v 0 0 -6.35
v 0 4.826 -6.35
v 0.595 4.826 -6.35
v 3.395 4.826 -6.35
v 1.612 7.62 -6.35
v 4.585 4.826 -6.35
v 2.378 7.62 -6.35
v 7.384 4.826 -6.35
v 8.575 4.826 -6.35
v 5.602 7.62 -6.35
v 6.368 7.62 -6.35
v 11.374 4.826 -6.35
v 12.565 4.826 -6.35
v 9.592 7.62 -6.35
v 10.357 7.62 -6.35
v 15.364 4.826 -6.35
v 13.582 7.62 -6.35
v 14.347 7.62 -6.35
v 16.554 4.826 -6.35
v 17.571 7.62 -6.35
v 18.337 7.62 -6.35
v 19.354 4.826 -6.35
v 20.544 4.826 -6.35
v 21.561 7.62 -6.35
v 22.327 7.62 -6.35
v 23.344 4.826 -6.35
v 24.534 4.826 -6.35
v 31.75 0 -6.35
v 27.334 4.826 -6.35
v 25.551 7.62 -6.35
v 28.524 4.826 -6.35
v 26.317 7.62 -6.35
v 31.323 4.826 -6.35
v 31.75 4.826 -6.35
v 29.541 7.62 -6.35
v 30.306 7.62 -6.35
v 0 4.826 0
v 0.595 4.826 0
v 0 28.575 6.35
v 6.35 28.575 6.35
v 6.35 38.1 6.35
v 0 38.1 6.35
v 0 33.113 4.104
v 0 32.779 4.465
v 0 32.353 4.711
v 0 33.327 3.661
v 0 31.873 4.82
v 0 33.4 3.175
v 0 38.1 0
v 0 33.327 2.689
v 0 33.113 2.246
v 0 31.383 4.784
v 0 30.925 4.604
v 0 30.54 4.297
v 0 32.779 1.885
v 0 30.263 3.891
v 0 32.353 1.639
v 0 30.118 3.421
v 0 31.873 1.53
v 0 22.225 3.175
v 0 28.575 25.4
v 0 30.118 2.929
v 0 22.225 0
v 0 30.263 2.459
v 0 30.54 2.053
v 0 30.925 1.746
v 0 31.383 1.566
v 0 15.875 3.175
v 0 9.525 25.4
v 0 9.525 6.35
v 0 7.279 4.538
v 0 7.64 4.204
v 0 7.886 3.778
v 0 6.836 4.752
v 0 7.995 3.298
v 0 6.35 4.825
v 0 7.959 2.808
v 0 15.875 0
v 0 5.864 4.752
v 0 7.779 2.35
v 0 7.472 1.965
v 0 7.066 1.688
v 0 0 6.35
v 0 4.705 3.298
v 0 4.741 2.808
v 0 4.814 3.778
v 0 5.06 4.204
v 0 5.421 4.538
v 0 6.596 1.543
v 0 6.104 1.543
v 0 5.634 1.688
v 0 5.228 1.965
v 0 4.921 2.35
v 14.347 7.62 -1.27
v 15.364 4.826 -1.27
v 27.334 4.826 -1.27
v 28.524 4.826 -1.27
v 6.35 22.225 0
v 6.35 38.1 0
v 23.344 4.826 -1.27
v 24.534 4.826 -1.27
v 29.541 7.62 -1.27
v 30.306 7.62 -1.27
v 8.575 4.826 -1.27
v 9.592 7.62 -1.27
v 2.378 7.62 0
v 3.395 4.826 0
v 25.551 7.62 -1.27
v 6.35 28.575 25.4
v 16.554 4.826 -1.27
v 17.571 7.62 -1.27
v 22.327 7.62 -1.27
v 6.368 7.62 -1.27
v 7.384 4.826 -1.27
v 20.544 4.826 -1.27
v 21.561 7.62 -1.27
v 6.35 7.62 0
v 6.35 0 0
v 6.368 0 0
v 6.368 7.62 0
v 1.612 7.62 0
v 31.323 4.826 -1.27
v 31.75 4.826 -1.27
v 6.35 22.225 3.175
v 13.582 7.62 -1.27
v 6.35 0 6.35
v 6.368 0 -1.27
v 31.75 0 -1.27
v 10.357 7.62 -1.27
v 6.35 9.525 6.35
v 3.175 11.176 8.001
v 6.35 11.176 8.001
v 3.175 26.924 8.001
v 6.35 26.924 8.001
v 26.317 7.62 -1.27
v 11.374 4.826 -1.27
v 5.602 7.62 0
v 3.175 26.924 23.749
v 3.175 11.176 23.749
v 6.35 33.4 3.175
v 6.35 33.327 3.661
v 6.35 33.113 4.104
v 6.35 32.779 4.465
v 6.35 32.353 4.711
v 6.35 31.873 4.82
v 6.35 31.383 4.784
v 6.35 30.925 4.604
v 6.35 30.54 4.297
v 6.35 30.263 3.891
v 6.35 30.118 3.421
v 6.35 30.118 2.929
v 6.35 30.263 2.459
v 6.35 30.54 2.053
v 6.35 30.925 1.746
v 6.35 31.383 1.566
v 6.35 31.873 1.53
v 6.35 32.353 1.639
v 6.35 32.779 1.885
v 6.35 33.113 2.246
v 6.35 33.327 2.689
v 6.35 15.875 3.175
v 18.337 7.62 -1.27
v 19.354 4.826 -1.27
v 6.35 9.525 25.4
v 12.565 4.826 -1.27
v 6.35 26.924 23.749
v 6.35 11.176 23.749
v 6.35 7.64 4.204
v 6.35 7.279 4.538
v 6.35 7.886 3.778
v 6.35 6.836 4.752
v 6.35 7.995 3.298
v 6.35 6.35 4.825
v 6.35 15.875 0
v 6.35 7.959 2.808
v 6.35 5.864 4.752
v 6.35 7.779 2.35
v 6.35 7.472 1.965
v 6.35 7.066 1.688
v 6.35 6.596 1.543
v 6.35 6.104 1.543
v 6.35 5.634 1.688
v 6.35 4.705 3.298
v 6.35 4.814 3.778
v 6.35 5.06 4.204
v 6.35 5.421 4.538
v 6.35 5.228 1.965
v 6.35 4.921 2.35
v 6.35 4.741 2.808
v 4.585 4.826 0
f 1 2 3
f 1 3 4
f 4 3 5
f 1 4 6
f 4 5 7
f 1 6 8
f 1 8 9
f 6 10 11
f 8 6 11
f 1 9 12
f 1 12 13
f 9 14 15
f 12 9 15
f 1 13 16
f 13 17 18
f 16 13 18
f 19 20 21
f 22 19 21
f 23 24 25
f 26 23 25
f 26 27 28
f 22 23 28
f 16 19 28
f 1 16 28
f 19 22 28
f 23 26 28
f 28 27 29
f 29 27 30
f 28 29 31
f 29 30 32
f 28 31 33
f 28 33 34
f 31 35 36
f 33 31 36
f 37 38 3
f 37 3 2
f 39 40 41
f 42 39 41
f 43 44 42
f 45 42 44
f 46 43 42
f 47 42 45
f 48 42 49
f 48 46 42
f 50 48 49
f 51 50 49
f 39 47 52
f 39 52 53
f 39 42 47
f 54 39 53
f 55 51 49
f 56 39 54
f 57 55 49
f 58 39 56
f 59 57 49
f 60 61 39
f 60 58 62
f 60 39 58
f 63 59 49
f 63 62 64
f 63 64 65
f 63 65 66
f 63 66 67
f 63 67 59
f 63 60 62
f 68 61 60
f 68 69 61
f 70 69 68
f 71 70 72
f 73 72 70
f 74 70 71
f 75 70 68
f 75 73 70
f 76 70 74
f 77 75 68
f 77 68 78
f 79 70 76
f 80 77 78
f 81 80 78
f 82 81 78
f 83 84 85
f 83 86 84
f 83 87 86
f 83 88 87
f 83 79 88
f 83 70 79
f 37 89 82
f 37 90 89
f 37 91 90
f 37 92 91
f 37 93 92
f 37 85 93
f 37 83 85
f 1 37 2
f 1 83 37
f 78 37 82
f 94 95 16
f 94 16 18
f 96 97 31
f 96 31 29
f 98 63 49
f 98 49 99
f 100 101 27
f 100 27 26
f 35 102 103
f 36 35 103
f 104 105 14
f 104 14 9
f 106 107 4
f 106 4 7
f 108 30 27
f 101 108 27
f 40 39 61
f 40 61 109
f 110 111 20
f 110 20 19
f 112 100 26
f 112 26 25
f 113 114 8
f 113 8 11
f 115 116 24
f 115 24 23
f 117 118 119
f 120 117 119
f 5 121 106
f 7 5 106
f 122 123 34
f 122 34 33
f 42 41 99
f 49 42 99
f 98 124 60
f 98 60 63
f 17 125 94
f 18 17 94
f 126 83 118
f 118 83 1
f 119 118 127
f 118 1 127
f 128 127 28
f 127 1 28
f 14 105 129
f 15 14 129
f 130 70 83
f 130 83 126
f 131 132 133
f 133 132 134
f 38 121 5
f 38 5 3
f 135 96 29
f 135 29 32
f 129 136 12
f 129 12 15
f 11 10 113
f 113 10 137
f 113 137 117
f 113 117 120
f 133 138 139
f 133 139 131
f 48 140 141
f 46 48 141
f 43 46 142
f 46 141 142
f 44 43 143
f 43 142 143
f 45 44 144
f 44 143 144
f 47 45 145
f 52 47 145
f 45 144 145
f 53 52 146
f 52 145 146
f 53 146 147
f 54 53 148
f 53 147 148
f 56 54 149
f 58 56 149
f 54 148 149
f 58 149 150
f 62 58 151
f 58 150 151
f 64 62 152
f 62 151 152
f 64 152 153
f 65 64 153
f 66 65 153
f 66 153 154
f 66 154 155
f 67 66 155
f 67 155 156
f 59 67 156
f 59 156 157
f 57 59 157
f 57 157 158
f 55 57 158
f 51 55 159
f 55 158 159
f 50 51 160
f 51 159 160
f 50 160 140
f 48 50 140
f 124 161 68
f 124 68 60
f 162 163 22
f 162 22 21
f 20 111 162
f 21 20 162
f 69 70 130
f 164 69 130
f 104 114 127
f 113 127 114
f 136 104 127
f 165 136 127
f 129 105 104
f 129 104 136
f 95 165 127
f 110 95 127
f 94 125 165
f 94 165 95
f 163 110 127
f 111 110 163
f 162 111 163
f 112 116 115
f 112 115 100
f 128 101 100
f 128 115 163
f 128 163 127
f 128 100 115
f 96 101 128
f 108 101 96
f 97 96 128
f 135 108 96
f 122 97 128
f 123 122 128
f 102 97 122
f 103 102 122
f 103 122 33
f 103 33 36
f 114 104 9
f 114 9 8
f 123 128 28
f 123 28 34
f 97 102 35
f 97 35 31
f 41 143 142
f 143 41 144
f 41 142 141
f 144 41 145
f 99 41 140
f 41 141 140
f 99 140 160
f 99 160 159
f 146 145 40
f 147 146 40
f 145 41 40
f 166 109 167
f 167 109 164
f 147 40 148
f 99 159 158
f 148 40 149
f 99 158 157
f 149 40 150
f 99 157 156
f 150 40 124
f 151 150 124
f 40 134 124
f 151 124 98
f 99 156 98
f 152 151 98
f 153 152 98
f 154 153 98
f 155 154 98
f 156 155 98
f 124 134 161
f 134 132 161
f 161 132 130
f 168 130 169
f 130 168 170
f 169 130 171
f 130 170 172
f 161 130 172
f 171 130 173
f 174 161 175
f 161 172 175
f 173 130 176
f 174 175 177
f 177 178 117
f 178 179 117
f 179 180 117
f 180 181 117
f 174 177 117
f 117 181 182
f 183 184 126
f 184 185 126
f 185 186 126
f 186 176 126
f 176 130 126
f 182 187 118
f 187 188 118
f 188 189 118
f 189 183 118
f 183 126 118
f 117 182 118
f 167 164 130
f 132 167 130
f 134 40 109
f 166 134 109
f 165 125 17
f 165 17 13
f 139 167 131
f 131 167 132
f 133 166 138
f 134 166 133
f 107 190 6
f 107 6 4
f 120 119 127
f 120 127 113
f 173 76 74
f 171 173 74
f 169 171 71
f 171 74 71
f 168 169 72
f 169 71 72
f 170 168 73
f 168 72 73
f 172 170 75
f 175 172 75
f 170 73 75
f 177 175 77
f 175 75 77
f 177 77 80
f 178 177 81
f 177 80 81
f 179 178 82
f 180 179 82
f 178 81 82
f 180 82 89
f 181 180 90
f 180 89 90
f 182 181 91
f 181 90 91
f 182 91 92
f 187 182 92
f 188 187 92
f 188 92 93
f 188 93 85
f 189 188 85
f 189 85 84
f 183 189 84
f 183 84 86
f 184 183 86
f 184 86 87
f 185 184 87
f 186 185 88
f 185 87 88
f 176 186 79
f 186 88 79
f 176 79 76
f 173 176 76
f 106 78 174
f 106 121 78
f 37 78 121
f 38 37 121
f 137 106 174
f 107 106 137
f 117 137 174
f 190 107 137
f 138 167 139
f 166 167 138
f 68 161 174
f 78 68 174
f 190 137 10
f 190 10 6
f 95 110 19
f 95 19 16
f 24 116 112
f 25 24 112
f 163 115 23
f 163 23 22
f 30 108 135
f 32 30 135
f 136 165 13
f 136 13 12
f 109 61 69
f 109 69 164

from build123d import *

# Parameters (mm, degrees)
BLANKSKE_W          = 31.75
BLANKSKE_H          = 7.62
BLANK_DEPTH         = 6.35
TOOTHCUTSIM_DEPTH   = 34.263334168
TEETHCUTS_COUNT     = 9
TEETHCUTS_PITCH     = 3.989822666
SKETCH1_W           = 6.35
SKETCH1_H           = 12.7
BOSS_EXTRUDE1_DEPTH = 6.35
SKETCH2_R           = 1.65
CUT_EXTRUDE1_DEPTH  = 6.35
SKETCH4_W           = 6.35
SKETCH4_H           = 19.05
BOSS_EXTRUDE3_DEPTH = 19.05
SKETCH6_W           = 6.35
SKETCH6_H           = 12.7
BOSS_EXTRUDE5_DEPTH = 6.35
SKETCH7_R           = 1.65
CUT_EXTRUDE2_DEPTH  = 6.35
SKETCH8_W           = 15.748
SKETCH8_H           = 15.748
CUT_EXTRUDE3_DEPTH  = 3.175
SKETCH11_W          = 6.35
SKETCH11_H          = 6.35
BOSS_EXTRUDE7_DEPTH = 12.7
SKETCH12_W          = 3.175
SKETCH12_H          = 6.35
CUT_EXTRUDE4_DEPTH  = 6.35
SKETCH13_W          = 25.382452533
SKETCH13_H          = 7.62
CUT_EXTRUDE5_DEPTH  = 1.27


with BuildPart() as part:
    # BlankSke → Blank (new body)
    with BuildSketch(Plane.XY):
        with Locations((15.875, 3.81)):
            Rectangle(BLANKSKE_W, BLANKSKE_H)
    extrude(amount=-BLANK_DEPTH)

    # TooCutSkeSim → ToothCutSim (cut, through all)
    with BuildSketch(Plane.XY):
        Polygon((0.595165029, 4.826), (-0.595165029, 4.826), (-1.621342708, 7.6454), (1.621342708, 7.6454), align=None)
    toothcutsim = extrude(amount=-TOOTHCUTSIM_DEPTH, mode=Mode.SUBTRACT)

    # TeethCuts: ToothCutSim ×9
    with Locations(*[(i * TEETHCUTS_PITCH, 0, 0) for i in range(1, TEETHCUTS_COUNT)]):
        add(toothcutsim, mode=Mode.SUBTRACT)

    # Sketch1 → Boss-Extrude1 (add)
    with BuildSketch(Plane.XY):
        with Locations((3.175, 6.35)):
            Rectangle(SKETCH1_W, SKETCH1_H)
    extrude(amount=BOSS_EXTRUDE1_DEPTH)

    # Sketch2 → Cut-Extrude1 (cut)
    with BuildSketch(Plane.ZY):
        with Locations((3.175, 6.35)):
            Circle(SKETCH2_R)
    extrude(amount=-CUT_EXTRUDE1_DEPTH, mode=Mode.SUBTRACT)

    # Sketch4 → Boss-Extrude3 (add)
    with BuildSketch(Plane.XY.offset(6.35)):
        with Locations((3.175, 19.05)):
            Rectangle(SKETCH4_W, SKETCH4_H)
    extrude(amount=BOSS_EXTRUDE3_DEPTH)

    # Sketch6 → Boss-Extrude5 (add)
    with BuildSketch(Plane(origin=(6.35, 0, 0), x_dir=(0, 0, -1), z_dir=(1, 0, 0))):
        with Locations((-3.175, 31.75)):
            Rectangle(SKETCH6_W, SKETCH6_H)
    extrude(amount=-BOSS_EXTRUDE5_DEPTH)

    # Sketch7 → Cut-Extrude2 (cut)
    with BuildSketch(Plane(origin=(6.35, 0, 0), x_dir=(0, 0, -1), z_dir=(1, 0, 0))):
        with Locations(Location((-3.175, 31.75, 0), (0, 0, 90))):
            Circle(SKETCH7_R)
    extrude(amount=-CUT_EXTRUDE2_DEPTH, mode=Mode.SUBTRACT)

    # Sketch8 → Cut-Extrude3 (cut)
    with BuildSketch(Plane(origin=(6.35, 0, 0), x_dir=(0, 0, -1), z_dir=(1, 0, 0))):
        with Locations((-15.875, 19.05)):
            Rectangle(SKETCH8_W, SKETCH8_H)
    extrude(amount=-CUT_EXTRUDE3_DEPTH, mode=Mode.SUBTRACT)

    # Sketch11 → Boss-Extrude7 (add)
    with BuildSketch(Plane(origin=(0, 12.7, 0), x_dir=(1, 0, 0), z_dir=(0, 1, 0))):
        with Locations((3.175, -3.175)):
            Rectangle(SKETCH11_W, SKETCH11_H)
    extrude(amount=BOSS_EXTRUDE7_DEPTH)

    # Sketch12 → Cut-Extrude4 (cut)
    with BuildSketch(Plane(origin=(6.35, 0, 0), x_dir=(0, 0, -1), z_dir=(1, 0, 0))):
        with Locations((-1.5875, 19.05)):
            Rectangle(SKETCH12_W, SKETCH12_H)
    extrude(amount=-CUT_EXTRUDE4_DEPTH, mode=Mode.SUBTRACT)

    # Sketch13 → Cut-Extrude5 (cut)
    with BuildSketch(Plane.XY):
        with Locations((19.058773734, 3.81)):
            Rectangle(SKETCH13_W, SKETCH13_H)
    extrude(amount=-CUT_EXTRUDE5_DEPTH, mode=Mode.SUBTRACT)


solid = part.part
